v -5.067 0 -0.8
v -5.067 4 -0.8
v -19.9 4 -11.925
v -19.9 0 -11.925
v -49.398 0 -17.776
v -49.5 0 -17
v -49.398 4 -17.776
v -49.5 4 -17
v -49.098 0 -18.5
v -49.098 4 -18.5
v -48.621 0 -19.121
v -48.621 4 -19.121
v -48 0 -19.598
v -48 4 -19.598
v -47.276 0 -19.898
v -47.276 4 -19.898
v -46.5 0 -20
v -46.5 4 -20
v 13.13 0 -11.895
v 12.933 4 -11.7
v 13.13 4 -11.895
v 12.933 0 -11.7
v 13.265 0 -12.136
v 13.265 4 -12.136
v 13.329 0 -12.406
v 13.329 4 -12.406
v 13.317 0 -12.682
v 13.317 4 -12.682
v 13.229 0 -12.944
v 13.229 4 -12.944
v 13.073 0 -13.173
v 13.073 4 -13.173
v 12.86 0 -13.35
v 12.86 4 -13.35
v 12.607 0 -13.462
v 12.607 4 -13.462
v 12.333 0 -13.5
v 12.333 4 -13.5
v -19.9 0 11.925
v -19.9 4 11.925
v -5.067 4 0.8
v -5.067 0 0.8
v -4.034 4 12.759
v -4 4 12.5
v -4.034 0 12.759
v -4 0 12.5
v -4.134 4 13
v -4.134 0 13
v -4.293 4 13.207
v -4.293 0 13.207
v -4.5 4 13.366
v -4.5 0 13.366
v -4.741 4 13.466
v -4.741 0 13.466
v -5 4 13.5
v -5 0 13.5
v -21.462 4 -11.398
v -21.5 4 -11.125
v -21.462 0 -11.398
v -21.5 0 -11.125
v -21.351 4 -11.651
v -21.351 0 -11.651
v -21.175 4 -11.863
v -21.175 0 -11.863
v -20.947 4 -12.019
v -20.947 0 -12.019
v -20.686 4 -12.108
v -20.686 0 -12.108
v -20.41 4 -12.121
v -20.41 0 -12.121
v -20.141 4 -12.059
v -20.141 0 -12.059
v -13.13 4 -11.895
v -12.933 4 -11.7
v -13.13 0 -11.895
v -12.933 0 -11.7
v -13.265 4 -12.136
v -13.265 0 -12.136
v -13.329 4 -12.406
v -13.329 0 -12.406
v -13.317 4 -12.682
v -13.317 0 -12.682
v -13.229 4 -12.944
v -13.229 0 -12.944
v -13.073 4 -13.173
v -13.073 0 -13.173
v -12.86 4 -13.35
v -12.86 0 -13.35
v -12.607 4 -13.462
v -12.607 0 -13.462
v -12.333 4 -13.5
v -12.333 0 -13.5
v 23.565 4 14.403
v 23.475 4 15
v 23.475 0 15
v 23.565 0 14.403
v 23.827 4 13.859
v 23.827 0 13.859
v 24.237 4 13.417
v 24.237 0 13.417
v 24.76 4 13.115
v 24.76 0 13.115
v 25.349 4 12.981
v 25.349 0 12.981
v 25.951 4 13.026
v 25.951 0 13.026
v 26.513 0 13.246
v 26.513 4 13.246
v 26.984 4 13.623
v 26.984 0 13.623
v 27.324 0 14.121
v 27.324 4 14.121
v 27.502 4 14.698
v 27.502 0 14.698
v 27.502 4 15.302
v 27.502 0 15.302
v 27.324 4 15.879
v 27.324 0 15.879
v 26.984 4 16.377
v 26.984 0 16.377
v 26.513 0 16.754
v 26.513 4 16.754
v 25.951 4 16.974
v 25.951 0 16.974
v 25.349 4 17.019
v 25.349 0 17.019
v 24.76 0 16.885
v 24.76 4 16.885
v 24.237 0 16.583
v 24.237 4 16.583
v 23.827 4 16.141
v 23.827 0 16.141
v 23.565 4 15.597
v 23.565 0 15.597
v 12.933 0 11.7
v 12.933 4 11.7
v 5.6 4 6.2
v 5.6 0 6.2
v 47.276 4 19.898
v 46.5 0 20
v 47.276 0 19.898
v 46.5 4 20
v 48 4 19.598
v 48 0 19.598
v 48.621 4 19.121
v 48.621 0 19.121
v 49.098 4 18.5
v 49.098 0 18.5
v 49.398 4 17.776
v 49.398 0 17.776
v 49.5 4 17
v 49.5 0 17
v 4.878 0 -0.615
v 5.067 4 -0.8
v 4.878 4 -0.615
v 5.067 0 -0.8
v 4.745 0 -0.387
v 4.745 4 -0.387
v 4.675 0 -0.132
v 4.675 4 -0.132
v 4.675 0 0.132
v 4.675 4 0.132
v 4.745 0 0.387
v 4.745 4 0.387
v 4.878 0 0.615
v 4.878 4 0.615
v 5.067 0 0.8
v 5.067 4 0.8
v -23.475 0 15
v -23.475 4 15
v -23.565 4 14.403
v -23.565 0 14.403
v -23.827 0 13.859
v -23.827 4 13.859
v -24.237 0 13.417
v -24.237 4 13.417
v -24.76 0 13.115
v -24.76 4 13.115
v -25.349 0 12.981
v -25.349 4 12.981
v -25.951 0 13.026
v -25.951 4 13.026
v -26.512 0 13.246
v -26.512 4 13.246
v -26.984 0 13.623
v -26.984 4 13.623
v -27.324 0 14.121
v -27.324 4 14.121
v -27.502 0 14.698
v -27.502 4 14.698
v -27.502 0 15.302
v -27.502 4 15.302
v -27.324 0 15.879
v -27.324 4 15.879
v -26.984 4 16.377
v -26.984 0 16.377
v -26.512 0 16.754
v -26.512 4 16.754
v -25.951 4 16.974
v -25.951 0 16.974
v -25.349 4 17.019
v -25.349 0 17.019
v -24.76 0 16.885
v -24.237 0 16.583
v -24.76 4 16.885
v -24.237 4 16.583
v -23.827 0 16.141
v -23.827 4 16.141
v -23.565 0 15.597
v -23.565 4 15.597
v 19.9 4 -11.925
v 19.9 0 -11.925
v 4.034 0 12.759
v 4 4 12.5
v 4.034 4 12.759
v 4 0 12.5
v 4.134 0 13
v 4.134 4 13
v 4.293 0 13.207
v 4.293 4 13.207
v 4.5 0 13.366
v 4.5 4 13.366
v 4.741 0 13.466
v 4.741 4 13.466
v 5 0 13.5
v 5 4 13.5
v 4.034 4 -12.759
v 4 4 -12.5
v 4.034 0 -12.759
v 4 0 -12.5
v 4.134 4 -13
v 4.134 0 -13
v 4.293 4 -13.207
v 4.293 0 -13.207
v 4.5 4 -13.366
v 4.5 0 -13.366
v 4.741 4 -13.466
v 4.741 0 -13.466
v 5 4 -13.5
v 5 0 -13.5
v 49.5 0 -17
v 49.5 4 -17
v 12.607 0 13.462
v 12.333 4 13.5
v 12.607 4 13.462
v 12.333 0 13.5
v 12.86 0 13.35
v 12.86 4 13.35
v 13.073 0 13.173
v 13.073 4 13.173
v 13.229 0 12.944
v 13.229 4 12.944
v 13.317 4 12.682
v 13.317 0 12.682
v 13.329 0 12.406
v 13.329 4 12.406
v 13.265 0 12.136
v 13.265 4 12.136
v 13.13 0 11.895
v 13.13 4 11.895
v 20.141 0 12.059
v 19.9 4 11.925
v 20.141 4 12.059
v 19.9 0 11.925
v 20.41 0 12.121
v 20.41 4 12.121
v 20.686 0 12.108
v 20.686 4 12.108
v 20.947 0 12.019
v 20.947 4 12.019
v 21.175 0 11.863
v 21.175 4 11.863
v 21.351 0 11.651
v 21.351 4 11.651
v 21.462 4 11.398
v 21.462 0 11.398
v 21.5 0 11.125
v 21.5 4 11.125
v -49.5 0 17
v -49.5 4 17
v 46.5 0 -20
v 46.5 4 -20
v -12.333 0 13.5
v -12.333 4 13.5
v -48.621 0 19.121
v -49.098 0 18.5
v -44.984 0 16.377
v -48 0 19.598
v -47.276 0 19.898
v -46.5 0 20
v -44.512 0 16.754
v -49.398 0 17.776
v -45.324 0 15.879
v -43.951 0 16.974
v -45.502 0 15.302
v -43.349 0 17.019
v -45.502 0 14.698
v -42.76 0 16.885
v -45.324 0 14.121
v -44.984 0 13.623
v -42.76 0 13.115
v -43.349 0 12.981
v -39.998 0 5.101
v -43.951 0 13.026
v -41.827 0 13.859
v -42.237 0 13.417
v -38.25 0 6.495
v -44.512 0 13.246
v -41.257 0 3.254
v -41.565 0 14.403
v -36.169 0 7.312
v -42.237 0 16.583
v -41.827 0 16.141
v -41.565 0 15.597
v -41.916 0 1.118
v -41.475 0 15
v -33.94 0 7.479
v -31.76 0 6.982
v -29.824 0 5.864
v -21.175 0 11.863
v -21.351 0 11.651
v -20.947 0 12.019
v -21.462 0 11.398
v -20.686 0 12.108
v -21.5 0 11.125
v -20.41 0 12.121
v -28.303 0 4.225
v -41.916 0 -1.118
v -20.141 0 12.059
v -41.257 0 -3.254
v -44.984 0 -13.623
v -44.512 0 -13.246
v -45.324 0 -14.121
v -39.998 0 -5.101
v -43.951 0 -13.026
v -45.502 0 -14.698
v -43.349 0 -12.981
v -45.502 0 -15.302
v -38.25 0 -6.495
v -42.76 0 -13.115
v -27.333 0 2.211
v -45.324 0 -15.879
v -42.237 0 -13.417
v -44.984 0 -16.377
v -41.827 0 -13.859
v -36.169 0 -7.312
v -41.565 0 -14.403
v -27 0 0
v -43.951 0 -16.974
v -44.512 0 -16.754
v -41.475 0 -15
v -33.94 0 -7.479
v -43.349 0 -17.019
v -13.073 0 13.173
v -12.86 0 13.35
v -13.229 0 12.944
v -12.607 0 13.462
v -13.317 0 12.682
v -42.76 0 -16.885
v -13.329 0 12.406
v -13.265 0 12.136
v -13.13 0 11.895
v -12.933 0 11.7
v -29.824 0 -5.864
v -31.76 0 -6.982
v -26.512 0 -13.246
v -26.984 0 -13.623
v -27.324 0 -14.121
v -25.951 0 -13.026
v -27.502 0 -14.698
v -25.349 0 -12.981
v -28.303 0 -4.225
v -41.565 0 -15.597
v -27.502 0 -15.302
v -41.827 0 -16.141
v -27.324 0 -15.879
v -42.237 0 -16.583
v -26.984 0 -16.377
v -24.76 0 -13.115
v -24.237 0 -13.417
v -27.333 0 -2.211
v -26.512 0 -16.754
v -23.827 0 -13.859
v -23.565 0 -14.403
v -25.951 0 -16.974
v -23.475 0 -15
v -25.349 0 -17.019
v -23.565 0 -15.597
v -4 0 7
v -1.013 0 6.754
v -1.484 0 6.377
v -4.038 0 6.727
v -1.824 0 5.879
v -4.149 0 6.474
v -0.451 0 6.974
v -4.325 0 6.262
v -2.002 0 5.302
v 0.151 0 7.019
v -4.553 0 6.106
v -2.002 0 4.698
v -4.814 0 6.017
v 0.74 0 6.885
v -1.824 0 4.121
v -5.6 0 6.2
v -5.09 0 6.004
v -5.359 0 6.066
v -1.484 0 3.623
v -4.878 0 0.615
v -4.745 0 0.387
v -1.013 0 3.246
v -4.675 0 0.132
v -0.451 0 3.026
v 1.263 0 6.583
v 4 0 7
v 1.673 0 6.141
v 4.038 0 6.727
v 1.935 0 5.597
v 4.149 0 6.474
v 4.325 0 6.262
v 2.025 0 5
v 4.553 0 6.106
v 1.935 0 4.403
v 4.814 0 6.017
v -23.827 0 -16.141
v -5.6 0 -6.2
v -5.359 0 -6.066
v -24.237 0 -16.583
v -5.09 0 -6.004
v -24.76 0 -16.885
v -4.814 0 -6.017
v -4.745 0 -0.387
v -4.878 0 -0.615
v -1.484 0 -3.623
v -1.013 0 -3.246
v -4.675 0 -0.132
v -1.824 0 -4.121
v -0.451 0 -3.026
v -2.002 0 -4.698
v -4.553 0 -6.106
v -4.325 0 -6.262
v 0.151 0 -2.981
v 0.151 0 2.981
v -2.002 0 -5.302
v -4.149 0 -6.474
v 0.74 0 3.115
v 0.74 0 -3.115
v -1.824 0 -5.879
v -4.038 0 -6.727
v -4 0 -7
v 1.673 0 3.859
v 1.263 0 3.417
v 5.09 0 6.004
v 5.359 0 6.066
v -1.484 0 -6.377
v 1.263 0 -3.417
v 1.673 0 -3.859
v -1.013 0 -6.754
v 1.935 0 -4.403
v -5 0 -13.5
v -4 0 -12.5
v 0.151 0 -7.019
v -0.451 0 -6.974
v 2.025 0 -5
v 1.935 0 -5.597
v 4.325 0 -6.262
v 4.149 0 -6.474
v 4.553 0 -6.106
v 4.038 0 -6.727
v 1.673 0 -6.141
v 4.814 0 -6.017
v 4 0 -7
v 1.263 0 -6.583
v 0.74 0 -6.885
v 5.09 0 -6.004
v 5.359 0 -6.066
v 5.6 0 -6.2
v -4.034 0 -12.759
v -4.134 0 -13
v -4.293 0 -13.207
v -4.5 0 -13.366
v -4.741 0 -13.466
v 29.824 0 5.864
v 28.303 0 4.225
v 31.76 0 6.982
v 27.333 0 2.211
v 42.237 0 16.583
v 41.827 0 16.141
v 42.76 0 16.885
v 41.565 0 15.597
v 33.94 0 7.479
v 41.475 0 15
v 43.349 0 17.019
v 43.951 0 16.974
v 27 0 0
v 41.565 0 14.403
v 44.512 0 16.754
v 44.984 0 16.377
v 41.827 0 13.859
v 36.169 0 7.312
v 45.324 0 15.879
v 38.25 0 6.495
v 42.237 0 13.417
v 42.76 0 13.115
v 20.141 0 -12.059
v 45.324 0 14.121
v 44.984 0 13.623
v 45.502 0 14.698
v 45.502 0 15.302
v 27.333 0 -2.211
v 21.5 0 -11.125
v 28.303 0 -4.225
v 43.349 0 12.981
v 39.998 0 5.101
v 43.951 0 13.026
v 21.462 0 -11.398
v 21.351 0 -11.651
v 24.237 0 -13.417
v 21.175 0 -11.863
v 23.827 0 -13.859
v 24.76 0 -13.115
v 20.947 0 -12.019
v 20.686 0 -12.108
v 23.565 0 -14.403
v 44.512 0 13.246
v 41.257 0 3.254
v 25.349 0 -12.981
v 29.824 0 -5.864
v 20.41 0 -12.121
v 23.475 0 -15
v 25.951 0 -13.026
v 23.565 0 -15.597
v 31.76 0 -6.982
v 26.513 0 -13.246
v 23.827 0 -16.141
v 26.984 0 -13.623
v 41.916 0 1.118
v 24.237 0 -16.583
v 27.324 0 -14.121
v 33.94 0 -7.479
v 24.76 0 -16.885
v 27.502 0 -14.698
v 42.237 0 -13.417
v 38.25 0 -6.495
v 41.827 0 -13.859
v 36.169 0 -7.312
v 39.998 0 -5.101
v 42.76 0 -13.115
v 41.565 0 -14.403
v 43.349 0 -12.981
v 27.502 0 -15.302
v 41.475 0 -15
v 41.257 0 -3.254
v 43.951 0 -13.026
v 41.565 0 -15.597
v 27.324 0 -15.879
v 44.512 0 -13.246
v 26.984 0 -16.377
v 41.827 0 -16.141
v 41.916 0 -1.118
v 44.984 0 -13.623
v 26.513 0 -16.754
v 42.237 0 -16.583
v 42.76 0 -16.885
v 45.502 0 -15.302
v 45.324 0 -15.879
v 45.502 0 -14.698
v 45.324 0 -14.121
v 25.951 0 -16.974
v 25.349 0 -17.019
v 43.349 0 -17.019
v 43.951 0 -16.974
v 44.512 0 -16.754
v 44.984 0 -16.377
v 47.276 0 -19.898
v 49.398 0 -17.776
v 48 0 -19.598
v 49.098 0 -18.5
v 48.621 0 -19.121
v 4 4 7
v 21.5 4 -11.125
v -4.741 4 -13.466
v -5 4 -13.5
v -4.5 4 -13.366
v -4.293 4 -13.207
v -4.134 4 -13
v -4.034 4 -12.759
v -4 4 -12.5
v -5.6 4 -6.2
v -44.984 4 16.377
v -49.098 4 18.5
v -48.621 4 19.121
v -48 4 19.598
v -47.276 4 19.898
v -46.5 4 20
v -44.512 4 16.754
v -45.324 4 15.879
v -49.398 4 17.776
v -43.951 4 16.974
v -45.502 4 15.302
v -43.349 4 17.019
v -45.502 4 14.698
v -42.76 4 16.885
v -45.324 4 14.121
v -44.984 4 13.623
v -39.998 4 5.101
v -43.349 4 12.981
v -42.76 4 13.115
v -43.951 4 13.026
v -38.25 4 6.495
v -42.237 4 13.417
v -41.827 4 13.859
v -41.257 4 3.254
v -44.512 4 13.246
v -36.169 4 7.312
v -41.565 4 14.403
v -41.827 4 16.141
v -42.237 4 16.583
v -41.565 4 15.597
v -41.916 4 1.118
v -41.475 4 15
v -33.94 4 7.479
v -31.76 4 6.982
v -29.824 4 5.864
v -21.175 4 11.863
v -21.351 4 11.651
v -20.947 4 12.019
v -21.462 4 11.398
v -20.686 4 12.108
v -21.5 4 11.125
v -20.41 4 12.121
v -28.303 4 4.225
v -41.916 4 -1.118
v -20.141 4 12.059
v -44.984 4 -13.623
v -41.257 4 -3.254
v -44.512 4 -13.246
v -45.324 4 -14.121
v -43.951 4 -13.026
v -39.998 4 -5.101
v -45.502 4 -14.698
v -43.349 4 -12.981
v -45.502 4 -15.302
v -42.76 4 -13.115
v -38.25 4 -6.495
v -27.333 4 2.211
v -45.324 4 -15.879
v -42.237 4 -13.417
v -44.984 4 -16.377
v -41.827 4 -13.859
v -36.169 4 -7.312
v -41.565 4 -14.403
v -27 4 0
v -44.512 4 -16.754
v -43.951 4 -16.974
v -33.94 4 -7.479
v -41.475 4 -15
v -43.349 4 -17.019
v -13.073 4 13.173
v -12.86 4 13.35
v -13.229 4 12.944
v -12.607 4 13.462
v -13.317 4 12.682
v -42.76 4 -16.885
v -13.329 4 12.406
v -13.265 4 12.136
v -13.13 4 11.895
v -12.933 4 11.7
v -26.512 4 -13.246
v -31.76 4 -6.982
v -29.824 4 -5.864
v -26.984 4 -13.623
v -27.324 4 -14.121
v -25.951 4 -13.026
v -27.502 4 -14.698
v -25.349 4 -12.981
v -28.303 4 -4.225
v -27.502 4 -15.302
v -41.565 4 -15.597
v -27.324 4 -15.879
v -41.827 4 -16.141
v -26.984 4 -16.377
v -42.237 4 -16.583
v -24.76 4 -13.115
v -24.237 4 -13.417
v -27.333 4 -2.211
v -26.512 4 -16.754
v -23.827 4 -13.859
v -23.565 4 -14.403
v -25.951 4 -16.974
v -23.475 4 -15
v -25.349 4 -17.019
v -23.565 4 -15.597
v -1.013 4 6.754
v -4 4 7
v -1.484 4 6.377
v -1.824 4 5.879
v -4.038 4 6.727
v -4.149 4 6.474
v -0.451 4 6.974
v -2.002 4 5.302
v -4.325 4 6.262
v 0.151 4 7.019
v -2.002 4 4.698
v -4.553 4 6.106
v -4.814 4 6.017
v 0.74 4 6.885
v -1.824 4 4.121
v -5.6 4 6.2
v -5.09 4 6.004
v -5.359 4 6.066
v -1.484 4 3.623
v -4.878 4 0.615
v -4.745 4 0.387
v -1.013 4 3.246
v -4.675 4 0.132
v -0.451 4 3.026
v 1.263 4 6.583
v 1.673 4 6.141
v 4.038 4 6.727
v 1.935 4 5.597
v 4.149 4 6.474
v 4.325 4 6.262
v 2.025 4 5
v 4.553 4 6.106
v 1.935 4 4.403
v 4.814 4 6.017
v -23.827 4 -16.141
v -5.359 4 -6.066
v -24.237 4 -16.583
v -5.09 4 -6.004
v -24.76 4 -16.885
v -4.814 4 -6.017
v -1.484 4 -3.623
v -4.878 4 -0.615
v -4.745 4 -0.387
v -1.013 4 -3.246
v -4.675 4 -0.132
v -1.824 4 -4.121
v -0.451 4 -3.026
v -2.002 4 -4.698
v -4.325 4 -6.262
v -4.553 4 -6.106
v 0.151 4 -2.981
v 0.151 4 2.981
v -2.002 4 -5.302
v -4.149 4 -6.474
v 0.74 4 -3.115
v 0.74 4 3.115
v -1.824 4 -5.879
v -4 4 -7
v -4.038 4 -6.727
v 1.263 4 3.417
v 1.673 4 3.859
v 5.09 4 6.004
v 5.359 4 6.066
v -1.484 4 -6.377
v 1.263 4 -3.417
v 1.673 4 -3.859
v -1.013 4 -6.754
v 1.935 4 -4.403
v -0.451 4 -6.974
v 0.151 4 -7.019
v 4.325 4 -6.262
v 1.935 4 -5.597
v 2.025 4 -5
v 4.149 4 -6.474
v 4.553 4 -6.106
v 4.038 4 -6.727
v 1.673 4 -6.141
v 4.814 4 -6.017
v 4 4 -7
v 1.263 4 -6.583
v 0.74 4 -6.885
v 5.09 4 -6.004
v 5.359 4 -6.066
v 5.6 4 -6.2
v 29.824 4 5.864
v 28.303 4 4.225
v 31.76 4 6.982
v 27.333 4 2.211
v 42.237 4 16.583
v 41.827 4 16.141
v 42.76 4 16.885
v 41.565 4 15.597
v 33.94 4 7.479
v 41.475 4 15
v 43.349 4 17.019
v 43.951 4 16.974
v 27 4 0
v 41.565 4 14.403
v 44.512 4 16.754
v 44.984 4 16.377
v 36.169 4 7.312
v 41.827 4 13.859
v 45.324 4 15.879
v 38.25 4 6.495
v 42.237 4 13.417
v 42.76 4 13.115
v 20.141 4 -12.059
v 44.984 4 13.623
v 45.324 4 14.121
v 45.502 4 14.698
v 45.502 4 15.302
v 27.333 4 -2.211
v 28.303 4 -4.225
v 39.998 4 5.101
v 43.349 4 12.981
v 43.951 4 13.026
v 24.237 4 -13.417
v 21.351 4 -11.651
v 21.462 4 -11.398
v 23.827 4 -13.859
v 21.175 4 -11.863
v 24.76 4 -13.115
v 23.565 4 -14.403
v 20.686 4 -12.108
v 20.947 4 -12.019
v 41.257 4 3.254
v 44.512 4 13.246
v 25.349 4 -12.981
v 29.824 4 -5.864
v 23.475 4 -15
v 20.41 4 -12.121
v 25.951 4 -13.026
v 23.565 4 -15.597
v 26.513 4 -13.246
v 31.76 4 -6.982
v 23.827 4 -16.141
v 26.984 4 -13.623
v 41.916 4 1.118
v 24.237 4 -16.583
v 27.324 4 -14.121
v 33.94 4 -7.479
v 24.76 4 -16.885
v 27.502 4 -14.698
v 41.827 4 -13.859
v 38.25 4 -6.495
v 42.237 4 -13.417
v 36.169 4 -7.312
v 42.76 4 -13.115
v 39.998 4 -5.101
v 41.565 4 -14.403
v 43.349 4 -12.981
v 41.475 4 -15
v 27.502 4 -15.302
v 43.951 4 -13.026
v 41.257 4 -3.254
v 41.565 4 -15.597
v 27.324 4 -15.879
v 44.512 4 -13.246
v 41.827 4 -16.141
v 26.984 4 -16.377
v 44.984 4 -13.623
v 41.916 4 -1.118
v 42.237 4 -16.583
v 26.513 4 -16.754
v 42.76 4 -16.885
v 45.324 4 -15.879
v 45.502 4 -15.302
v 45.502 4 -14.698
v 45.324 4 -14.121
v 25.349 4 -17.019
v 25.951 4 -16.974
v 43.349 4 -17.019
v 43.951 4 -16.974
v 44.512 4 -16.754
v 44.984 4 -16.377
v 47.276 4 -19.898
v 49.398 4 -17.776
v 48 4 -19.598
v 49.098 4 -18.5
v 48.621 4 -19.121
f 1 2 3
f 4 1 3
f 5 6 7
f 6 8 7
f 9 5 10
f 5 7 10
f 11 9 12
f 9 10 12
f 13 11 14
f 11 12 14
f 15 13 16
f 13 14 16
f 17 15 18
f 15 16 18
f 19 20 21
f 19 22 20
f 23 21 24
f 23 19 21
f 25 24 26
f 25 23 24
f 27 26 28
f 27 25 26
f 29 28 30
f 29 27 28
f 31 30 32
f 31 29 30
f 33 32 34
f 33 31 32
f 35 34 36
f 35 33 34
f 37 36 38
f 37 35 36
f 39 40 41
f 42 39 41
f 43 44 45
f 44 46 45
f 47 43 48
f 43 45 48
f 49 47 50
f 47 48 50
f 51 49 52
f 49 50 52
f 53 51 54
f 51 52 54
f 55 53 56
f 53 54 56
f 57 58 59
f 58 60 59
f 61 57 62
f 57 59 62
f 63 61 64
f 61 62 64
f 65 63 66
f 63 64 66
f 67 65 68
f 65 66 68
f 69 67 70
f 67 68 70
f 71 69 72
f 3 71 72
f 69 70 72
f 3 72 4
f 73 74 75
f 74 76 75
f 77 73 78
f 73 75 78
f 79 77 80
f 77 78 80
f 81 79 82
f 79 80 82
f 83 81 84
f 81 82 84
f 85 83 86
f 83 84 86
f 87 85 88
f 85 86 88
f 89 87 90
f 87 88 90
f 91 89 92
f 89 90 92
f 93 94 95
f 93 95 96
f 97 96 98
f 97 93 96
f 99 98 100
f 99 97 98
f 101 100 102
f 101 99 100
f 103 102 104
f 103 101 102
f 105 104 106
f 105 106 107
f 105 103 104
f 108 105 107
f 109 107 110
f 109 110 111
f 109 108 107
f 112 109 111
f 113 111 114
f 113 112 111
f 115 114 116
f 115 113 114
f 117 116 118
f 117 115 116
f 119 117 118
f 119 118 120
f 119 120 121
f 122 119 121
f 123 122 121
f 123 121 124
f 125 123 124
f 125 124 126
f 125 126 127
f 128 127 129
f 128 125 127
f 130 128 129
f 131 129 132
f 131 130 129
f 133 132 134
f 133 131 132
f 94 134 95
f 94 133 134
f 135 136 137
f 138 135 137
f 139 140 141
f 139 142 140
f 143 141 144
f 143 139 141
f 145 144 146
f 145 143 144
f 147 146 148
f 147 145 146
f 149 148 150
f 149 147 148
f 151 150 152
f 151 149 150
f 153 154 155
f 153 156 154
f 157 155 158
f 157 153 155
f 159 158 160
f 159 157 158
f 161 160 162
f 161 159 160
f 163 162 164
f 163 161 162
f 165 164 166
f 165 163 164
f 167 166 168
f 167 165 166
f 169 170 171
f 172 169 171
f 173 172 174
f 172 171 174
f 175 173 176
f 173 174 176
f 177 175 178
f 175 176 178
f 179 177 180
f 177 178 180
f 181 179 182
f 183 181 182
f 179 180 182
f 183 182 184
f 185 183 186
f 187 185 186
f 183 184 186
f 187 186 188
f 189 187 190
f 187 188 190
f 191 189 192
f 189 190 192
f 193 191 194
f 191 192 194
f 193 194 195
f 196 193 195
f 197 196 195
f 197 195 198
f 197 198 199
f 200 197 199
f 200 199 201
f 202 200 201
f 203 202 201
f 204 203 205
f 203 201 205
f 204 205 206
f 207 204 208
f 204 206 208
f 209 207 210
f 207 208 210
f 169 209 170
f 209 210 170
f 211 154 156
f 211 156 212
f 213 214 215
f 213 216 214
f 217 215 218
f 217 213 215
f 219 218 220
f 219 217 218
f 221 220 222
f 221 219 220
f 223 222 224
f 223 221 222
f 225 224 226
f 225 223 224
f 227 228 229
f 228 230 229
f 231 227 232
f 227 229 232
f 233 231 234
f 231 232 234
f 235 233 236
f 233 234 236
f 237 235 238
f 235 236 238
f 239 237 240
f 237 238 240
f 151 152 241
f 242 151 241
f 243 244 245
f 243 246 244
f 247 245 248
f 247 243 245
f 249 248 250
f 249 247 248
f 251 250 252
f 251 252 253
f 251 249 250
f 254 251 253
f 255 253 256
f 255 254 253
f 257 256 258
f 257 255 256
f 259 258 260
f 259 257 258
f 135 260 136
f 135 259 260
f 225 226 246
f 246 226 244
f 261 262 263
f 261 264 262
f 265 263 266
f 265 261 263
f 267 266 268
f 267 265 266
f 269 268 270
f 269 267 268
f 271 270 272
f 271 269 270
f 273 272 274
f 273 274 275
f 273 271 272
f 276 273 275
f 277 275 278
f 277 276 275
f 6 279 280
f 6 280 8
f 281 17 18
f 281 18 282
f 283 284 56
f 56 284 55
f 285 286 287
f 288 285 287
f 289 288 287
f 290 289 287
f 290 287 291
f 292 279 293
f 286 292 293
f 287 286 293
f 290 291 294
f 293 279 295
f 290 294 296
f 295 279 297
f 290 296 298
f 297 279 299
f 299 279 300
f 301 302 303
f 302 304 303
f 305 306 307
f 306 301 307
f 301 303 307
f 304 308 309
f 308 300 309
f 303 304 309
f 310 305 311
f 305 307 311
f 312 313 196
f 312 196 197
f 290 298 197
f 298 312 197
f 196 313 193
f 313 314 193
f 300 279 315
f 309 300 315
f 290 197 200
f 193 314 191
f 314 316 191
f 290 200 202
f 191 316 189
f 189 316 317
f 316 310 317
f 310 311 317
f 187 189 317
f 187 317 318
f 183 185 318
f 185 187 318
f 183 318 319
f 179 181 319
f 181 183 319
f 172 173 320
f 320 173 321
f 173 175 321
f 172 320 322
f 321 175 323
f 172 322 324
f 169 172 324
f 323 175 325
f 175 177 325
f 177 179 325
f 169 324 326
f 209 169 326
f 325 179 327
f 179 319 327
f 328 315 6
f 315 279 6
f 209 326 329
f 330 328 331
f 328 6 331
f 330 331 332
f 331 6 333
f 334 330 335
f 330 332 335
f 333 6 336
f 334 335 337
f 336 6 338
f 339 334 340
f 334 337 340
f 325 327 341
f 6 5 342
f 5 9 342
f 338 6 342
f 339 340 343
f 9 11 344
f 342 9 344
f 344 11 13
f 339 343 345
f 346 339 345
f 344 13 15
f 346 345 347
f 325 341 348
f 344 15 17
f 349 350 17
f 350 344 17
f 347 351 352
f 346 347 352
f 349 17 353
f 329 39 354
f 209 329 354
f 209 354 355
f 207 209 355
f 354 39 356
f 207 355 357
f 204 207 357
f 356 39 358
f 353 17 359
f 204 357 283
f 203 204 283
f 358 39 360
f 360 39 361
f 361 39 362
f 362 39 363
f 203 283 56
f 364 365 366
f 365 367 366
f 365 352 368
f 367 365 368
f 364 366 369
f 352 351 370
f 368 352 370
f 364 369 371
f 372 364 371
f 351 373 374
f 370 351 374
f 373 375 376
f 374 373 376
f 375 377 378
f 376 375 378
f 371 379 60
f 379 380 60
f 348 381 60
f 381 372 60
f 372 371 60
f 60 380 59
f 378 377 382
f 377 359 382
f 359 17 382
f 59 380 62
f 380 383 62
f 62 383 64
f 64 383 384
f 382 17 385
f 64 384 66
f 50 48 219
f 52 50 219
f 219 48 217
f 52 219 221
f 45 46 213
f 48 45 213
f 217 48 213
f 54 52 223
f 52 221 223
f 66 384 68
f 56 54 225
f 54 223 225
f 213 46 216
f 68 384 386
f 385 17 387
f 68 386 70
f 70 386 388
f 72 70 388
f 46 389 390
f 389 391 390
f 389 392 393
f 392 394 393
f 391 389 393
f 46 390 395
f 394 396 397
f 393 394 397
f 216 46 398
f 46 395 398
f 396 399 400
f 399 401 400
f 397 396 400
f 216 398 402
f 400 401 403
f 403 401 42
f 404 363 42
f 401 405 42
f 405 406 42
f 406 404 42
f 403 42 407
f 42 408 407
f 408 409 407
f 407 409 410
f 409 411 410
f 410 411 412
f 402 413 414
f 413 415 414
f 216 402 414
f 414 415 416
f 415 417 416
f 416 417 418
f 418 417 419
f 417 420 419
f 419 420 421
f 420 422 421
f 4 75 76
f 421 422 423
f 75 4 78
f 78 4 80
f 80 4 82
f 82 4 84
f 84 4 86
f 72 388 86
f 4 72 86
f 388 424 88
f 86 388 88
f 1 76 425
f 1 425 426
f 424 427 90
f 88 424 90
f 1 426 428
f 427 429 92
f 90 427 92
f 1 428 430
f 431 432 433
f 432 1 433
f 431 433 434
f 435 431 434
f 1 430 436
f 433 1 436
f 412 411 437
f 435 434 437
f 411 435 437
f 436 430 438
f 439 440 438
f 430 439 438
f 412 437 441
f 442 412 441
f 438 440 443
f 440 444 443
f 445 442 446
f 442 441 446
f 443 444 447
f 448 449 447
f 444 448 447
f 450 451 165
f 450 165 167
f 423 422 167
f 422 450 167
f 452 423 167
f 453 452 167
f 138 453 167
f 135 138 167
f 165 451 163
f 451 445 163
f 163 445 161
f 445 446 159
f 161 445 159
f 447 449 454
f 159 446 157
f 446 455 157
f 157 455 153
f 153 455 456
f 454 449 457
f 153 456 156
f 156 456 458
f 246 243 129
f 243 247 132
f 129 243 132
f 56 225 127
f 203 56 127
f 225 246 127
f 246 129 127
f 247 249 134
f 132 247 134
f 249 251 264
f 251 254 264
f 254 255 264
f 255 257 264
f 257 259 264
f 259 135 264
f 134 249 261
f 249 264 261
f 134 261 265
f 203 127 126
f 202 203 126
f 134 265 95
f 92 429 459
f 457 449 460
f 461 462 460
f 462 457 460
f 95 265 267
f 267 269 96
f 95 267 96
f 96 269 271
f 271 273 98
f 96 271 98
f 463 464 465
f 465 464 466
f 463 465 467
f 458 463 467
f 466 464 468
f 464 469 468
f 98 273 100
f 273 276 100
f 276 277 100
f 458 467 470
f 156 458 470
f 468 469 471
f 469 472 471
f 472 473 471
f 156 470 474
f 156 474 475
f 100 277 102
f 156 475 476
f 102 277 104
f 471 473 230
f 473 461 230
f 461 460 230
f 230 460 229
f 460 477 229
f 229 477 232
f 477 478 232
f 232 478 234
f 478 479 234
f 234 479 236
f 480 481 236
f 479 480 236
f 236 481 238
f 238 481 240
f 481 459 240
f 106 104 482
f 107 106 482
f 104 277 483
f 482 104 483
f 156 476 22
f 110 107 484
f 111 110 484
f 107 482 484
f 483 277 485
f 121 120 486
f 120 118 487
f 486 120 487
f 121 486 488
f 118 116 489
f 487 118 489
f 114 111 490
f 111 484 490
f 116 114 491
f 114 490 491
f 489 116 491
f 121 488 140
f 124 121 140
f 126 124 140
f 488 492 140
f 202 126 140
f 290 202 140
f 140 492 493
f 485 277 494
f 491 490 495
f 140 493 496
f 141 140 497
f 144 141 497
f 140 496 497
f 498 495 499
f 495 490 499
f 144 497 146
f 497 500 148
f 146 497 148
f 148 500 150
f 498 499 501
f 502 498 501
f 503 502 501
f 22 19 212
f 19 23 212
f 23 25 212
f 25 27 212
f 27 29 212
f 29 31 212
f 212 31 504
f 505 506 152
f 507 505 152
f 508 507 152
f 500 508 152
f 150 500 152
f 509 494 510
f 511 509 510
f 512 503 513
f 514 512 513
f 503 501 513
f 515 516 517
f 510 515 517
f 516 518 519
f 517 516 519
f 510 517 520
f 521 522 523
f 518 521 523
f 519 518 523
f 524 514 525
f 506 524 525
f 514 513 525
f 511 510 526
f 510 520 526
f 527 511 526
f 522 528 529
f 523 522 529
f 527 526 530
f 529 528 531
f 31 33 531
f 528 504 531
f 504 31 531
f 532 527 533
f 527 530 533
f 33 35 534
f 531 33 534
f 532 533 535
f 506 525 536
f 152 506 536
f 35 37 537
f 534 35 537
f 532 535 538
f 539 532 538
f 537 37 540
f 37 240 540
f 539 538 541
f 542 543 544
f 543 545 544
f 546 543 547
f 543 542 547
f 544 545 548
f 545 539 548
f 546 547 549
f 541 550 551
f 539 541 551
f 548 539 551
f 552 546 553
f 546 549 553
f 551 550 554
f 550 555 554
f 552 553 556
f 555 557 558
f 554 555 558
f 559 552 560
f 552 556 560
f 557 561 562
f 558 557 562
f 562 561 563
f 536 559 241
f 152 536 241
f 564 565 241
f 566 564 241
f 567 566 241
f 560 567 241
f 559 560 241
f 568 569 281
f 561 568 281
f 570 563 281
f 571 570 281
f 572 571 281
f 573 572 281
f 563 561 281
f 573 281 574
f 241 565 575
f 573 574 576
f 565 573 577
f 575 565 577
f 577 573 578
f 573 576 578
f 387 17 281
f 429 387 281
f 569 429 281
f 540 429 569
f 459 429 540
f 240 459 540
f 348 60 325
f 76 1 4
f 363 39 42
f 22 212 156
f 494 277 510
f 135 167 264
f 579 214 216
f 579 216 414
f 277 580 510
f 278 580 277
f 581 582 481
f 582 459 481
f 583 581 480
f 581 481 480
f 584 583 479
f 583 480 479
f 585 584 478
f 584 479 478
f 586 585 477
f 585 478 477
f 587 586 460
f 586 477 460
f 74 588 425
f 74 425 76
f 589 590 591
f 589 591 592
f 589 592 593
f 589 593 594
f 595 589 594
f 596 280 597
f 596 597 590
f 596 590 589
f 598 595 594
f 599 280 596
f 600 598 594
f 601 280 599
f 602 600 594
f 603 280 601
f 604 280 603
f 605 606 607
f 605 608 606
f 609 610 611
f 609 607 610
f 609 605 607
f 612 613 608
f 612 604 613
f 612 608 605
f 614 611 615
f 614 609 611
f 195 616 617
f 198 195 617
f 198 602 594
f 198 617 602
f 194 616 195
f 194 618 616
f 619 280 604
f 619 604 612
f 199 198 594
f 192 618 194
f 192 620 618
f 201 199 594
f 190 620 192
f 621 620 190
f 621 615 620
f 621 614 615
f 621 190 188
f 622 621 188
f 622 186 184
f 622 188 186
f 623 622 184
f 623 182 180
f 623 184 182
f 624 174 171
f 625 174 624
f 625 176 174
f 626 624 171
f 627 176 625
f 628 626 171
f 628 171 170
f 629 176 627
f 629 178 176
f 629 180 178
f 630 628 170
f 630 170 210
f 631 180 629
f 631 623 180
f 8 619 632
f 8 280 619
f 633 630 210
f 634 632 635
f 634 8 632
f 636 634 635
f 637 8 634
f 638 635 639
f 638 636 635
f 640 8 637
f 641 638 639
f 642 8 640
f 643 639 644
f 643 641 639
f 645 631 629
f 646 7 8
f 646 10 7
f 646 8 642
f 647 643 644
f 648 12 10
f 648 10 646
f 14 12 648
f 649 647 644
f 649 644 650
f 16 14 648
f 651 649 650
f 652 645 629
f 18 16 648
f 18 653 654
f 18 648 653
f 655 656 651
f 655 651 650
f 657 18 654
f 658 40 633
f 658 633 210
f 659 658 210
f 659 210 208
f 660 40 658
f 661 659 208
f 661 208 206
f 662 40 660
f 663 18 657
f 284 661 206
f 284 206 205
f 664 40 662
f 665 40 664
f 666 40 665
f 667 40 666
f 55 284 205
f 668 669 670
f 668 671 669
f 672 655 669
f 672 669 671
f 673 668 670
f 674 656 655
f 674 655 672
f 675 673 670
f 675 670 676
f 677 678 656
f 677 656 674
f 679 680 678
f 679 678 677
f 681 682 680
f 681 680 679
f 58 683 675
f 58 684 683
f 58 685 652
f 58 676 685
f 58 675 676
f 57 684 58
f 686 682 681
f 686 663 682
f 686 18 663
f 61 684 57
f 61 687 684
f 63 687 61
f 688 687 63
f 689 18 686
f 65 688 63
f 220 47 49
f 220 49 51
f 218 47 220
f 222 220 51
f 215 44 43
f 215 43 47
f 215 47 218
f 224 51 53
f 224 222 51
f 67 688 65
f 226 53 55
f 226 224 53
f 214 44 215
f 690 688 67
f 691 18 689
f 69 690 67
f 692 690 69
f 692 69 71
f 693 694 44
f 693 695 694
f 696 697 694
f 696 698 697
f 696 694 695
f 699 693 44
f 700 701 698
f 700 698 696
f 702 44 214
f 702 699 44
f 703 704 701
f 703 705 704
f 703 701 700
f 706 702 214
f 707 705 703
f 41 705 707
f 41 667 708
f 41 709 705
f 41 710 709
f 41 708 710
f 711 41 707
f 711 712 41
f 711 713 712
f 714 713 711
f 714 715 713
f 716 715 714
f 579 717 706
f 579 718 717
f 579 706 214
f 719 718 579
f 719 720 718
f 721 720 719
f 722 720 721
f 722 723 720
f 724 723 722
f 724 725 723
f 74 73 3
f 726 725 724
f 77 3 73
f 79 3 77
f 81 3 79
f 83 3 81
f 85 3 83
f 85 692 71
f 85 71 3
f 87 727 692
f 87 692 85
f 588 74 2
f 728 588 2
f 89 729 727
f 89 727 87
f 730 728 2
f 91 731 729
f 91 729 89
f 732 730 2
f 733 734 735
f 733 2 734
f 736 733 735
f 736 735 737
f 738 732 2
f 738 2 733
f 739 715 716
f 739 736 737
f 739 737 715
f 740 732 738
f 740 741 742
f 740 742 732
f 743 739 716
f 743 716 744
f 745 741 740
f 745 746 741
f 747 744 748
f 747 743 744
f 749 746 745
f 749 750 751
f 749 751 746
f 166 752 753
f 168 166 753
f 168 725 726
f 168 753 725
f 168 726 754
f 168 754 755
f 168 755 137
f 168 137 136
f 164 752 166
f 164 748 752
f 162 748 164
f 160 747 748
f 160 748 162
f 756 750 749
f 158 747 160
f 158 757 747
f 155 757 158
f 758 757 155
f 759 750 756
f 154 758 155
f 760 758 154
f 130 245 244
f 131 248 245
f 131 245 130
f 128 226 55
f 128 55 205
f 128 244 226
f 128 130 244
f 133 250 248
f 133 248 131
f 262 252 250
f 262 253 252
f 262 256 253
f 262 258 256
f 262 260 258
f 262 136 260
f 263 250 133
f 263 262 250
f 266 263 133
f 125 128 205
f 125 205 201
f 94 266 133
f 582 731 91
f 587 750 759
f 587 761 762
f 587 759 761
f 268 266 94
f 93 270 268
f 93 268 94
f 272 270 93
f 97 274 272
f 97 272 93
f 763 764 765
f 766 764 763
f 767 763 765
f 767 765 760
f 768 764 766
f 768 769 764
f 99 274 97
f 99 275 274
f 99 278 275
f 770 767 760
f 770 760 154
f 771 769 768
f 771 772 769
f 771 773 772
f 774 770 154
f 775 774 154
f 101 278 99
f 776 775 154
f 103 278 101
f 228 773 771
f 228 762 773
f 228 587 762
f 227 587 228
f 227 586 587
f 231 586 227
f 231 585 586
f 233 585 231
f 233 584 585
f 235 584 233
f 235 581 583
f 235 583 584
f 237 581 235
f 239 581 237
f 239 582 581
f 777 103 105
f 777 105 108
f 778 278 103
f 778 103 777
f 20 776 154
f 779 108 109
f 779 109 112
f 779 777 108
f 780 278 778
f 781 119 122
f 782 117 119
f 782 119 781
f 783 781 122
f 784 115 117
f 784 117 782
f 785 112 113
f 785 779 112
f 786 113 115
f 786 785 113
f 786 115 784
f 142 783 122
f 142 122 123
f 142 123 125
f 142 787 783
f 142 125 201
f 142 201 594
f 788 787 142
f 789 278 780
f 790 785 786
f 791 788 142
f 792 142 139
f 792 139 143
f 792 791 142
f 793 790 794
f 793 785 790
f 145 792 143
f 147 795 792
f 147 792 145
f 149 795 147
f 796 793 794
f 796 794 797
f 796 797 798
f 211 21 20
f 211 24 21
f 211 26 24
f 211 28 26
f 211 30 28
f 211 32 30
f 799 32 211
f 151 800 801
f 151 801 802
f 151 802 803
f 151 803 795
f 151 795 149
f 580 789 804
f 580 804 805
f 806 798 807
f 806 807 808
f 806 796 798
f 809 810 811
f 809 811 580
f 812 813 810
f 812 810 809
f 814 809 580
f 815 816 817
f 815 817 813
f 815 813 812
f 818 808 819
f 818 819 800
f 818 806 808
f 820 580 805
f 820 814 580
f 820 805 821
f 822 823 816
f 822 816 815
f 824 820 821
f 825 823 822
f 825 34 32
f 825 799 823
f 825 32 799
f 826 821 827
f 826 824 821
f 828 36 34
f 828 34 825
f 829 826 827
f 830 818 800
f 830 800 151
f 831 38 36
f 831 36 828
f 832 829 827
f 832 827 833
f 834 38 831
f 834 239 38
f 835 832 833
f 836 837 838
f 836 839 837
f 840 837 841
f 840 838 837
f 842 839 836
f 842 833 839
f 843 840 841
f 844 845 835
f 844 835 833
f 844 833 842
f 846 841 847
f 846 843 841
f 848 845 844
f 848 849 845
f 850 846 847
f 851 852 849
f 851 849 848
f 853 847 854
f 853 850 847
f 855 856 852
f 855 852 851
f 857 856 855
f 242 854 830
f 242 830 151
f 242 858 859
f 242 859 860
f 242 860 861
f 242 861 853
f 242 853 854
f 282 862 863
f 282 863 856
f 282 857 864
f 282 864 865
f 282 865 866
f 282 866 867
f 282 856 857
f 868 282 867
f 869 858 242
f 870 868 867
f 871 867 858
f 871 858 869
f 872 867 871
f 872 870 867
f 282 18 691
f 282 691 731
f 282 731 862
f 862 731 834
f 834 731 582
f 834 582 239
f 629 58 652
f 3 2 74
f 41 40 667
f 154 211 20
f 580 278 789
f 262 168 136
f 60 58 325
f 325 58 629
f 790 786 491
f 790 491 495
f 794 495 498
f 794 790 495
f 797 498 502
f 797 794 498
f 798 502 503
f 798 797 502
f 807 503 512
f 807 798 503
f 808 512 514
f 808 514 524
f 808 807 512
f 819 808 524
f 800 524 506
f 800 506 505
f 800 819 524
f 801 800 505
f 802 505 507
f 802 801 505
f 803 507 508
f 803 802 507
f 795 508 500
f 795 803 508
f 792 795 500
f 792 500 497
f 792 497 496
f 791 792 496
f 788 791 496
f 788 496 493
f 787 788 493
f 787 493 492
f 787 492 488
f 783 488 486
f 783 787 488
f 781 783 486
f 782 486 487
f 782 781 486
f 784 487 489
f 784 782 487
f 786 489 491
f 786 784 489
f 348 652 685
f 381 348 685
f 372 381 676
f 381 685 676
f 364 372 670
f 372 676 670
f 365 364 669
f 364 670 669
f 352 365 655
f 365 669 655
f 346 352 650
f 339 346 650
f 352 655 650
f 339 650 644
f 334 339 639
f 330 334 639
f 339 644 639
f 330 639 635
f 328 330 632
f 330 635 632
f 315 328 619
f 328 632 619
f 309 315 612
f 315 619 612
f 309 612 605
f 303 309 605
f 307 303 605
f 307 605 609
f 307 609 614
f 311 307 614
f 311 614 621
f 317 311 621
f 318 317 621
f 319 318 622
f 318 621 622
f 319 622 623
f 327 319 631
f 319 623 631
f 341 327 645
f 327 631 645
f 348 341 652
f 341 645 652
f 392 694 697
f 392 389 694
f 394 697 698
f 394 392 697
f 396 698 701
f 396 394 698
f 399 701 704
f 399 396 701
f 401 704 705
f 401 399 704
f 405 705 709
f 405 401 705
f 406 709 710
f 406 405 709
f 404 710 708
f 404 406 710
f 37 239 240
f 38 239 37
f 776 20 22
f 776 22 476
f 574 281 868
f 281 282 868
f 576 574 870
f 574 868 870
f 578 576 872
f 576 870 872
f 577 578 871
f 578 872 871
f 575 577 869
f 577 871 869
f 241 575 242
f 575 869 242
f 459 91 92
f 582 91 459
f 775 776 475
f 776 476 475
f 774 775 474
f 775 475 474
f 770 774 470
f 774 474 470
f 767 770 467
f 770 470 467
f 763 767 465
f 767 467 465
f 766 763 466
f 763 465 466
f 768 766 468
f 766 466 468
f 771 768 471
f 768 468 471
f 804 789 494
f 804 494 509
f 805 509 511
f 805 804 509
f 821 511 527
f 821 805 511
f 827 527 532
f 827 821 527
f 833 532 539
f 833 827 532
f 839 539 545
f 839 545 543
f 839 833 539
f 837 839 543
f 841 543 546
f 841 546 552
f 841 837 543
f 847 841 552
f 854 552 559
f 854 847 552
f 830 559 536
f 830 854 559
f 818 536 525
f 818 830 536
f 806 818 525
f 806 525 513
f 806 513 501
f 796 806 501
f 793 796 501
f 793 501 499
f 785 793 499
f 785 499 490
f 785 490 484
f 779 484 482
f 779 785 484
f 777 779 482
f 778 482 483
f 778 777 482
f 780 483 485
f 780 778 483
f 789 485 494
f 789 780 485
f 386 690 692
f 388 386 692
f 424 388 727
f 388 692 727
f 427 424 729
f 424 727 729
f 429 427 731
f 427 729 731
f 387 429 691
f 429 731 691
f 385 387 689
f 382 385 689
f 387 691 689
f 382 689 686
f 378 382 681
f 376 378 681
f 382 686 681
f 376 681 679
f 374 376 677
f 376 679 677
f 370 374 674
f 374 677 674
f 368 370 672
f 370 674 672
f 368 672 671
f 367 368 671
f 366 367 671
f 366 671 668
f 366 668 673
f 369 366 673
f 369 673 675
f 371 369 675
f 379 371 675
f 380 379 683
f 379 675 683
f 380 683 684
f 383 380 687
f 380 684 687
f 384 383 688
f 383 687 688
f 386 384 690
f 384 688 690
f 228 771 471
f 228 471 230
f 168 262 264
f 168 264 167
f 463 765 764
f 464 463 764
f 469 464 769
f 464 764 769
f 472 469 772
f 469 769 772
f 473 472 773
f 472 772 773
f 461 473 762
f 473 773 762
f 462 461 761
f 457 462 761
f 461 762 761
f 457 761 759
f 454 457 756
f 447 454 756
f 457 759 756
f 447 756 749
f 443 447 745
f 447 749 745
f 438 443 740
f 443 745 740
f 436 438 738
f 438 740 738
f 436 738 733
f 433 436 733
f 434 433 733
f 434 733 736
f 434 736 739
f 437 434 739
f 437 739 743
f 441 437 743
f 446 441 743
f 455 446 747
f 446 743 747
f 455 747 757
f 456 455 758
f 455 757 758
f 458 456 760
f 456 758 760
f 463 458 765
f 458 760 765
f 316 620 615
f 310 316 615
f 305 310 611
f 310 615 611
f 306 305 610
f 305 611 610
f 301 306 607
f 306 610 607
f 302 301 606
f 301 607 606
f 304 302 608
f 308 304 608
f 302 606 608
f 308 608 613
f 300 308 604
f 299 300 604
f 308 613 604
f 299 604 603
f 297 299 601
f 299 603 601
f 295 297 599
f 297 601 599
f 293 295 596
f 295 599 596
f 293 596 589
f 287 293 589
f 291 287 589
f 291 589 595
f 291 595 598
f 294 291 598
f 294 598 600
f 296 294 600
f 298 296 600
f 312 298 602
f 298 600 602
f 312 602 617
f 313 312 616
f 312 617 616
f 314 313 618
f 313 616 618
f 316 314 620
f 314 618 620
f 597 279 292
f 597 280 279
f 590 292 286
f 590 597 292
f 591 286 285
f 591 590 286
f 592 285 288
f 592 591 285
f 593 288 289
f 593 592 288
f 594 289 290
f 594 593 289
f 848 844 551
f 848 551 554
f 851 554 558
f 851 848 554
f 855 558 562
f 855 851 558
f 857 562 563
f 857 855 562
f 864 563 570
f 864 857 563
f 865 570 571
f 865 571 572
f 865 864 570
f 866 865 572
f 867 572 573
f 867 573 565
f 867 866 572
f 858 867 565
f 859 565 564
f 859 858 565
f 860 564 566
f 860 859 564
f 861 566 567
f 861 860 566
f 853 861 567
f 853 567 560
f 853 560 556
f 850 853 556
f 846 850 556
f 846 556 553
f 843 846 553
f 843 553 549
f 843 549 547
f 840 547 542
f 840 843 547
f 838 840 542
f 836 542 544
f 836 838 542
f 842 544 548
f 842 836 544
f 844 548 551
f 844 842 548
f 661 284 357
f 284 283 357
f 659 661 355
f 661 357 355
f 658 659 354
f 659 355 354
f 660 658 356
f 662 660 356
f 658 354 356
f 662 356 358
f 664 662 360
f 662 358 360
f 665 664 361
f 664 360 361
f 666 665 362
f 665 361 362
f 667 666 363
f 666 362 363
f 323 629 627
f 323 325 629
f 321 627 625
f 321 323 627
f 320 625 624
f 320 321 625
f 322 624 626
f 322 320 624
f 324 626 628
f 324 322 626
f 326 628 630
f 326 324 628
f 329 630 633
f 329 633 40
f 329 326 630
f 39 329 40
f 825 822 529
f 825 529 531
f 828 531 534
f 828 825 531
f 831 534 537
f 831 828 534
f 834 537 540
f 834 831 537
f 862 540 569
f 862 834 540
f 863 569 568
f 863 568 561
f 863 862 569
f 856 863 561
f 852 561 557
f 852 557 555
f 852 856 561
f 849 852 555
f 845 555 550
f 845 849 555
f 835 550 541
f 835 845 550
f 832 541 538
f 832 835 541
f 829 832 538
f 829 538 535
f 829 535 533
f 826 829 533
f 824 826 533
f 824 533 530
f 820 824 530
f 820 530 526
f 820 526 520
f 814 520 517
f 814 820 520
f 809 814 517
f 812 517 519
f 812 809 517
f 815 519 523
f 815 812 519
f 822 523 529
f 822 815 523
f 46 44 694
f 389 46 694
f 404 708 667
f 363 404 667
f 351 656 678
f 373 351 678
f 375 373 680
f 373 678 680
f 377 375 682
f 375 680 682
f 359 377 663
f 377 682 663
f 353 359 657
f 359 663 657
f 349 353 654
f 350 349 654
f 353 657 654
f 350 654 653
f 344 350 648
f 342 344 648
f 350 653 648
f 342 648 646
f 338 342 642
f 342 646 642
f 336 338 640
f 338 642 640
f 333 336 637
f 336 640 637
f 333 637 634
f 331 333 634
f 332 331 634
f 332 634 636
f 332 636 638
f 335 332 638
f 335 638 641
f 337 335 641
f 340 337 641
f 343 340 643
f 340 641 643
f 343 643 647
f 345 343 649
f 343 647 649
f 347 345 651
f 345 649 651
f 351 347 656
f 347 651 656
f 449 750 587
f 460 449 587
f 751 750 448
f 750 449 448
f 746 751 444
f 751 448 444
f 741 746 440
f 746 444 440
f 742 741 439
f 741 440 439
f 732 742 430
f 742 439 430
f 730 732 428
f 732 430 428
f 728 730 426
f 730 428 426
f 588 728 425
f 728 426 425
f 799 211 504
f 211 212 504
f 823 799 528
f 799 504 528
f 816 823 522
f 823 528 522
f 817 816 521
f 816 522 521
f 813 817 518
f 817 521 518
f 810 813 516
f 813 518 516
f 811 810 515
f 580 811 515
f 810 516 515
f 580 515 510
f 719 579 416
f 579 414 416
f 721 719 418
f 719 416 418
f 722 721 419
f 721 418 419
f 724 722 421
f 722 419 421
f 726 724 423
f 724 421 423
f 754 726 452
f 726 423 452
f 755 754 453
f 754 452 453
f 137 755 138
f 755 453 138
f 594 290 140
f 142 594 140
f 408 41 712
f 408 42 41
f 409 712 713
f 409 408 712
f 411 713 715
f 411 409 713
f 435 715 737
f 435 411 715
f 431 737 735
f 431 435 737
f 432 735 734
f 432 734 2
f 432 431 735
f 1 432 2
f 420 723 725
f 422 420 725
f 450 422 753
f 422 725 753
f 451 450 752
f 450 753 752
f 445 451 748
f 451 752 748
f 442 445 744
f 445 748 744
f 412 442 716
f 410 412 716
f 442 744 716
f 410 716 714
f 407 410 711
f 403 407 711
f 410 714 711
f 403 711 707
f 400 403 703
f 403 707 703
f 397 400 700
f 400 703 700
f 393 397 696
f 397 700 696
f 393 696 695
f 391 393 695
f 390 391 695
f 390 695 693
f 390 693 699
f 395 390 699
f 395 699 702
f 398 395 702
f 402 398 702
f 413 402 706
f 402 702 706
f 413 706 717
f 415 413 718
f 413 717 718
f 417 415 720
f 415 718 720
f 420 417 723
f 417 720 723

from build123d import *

# Parameters (mm, degrees)
SKETCH_1_W          = 99
SKETCH_1_H          = 40
EXTRUDE_1_DEPTH     = 4
SKETCH_2_R          = 2.025
CUT_EXTRUDE_1_DEPTH = 4
FILLET_1_R          = 3
CUT_EXTRUDE_2_DEPTH = 4
FILLET_2_R          = 1
SKETCH_4_R          = 7.5
CUT_EXTRUDE_3_DEPTH = 4
SKETCH_5_W          = 8
SKETCH_5_H          = 27
EXTRUDE_2_DEPTH     = 4
SKETCH_6_R          = 2.025
CUT_EXTRUDE_4_DEPTH = 4
FILLET_3_R          = 1


with BuildPart() as part:
    # 草图1 → 凸台-拉伸1 (new body)
    with BuildSketch(Plane(origin=(0, 0, 0), x_dir=(1, 0, 0), z_dir=(0, 1, 0))):
        Rectangle(SKETCH_1_W, SKETCH_1_H)
    extrude(amount=EXTRUDE_1_DEPTH)

    # 草图2 → 切除-拉伸1 (cut)
    with BuildSketch(Plane(origin=(0, 4, 0), x_dir=(1, 0, 0), z_dir=(0, 1, 0))):
        with Locations((-43.5, 15)):
            Circle(SKETCH_2_R)
        with Locations((-43.5, -15)):
            Circle(SKETCH_2_R)
        with Locations((-25.5, -15)):
            Circle(SKETCH_2_R)
        with Locations((-25.5, 15)):
            Circle(SKETCH_2_R)
    cut_extrude_1 = extrude(amount=-CUT_EXTRUDE_1_DEPTH, mode=Mode.SUBTRACT)

    # 镜向1: 切除-拉伸1 across plane
    add(cut_extrude_1.mirror(Plane(origin=(0, 0, 0), x_dir=(0, 0, 1), z_dir=(1, 0, 0))), mode=Mode.SUBTRACT)

    # 圆角1
    fillet_1_edges = [part.edges().sort_by_distance(p)[0] for p in [
        (49.5, 2, 20),
        (-49.5, 2, 20),
        (-49.5, 2, -20),
        (49.5, 2, -20),
    ]]
    fillet(fillet_1_edges, radius=FILLET_1_R)

    # 草图3 → 切除-拉伸2 (cut)
    with BuildSketch(Plane(origin=(0, 4, 0), x_dir=(1, 0, 0), z_dir=(0, 1, 0))):
        Polygon((-15.333333333, 13.5), (15.333333333, 13.5), (0, 2), align=None)
        Polygon((-21.5, 13.125), (-21.5, -13.125), (-4, 0), align=None)
        Polygon((-15.333333333, -13.5), (15.333333333, -13.5), (0, -2), align=None)
        Polygon((21.5, 13.125), (21.5, -13.125), (4, 0), align=None)
    extrude(amount=-CUT_EXTRUDE_2_DEPTH, mode=Mode.SUBTRACT)

    # 圆角2
    fillet_2_edges = [part.edges().sort_by_distance(p)[0] for p in [
        (15.333333333, 2, -13.5),
        (-15.333333333, 2, -13.5),
        (0, 2, -2),
        (15.333333333, 2, 13.5),
        (0, 2, 2),
        (-15.333333333, 2, 13.5),
        (-21.5, 2, 13.125),
        (-4, 2, 0),
        (-21.5, 2, -13.125),
        (21.5, 2, 13.125),
        (21.5, 2, -13.125),
        (4, 2, 0),
    ]]
    fillet(fillet_2_edges, radius=FILLET_2_R)

    # 草图4 → 切除-拉伸3 (cut)
    with BuildSketch(Plane(origin=(0, 4, 0), x_dir=(1, 0, 0), z_dir=(0, 1, 0))):
        with Locations((-34.5, 0)):
            Circle(SKETCH_4_R)
    cut_extrude_3 = extrude(amount=-CUT_EXTRUDE_3_DEPTH, mode=Mode.SUBTRACT)

    # 镜向2: 切除-拉伸3 across plane
    add(cut_extrude_3.mirror(Plane(origin=(0, 0, 0), x_dir=(0, 0, 1), z_dir=(1, 0, 0))), mode=Mode.SUBTRACT)

    # 草图5 → 凸台-拉伸2 (add)
    with BuildSketch(Plane(origin=(0, 4, 0), x_dir=(1, 0, 0), z_dir=(0, 1, 0))):
        Rectangle(SKETCH_5_W, SKETCH_5_H)
    extrude(amount=-EXTRUDE_2_DEPTH)

    # 草图6 → 切除-拉伸4 (cut)
    with BuildSketch(Plane(origin=(0, 4, 0), x_dir=(1, 0, 0), z_dir=(0, 1, 0))):
        with Locations((0, 5)):
            Circle(SKETCH_6_R)
        with Locations((0, -5)):
            Circle(SKETCH_6_R)
    extrude(amount=-CUT_EXTRUDE_4_DEPTH, mode=Mode.SUBTRACT)

    # 圆角3
    fillet_3_edges = [part.edges().sort_by_distance(p)[0] for p in [
        (-4, 2, 5),
        (4, 2, 5),
        (4, 2, -13.5),
        (-4, 2, 13.5),
        (-4, 2, -13.5),
        (-4, 2, -5),
        (4, 2, 13.5),
        (4, 2, -5),
    ]]
    fillet(fillet_3_edges, radius=FILLET_3_R)


solid = part.part
